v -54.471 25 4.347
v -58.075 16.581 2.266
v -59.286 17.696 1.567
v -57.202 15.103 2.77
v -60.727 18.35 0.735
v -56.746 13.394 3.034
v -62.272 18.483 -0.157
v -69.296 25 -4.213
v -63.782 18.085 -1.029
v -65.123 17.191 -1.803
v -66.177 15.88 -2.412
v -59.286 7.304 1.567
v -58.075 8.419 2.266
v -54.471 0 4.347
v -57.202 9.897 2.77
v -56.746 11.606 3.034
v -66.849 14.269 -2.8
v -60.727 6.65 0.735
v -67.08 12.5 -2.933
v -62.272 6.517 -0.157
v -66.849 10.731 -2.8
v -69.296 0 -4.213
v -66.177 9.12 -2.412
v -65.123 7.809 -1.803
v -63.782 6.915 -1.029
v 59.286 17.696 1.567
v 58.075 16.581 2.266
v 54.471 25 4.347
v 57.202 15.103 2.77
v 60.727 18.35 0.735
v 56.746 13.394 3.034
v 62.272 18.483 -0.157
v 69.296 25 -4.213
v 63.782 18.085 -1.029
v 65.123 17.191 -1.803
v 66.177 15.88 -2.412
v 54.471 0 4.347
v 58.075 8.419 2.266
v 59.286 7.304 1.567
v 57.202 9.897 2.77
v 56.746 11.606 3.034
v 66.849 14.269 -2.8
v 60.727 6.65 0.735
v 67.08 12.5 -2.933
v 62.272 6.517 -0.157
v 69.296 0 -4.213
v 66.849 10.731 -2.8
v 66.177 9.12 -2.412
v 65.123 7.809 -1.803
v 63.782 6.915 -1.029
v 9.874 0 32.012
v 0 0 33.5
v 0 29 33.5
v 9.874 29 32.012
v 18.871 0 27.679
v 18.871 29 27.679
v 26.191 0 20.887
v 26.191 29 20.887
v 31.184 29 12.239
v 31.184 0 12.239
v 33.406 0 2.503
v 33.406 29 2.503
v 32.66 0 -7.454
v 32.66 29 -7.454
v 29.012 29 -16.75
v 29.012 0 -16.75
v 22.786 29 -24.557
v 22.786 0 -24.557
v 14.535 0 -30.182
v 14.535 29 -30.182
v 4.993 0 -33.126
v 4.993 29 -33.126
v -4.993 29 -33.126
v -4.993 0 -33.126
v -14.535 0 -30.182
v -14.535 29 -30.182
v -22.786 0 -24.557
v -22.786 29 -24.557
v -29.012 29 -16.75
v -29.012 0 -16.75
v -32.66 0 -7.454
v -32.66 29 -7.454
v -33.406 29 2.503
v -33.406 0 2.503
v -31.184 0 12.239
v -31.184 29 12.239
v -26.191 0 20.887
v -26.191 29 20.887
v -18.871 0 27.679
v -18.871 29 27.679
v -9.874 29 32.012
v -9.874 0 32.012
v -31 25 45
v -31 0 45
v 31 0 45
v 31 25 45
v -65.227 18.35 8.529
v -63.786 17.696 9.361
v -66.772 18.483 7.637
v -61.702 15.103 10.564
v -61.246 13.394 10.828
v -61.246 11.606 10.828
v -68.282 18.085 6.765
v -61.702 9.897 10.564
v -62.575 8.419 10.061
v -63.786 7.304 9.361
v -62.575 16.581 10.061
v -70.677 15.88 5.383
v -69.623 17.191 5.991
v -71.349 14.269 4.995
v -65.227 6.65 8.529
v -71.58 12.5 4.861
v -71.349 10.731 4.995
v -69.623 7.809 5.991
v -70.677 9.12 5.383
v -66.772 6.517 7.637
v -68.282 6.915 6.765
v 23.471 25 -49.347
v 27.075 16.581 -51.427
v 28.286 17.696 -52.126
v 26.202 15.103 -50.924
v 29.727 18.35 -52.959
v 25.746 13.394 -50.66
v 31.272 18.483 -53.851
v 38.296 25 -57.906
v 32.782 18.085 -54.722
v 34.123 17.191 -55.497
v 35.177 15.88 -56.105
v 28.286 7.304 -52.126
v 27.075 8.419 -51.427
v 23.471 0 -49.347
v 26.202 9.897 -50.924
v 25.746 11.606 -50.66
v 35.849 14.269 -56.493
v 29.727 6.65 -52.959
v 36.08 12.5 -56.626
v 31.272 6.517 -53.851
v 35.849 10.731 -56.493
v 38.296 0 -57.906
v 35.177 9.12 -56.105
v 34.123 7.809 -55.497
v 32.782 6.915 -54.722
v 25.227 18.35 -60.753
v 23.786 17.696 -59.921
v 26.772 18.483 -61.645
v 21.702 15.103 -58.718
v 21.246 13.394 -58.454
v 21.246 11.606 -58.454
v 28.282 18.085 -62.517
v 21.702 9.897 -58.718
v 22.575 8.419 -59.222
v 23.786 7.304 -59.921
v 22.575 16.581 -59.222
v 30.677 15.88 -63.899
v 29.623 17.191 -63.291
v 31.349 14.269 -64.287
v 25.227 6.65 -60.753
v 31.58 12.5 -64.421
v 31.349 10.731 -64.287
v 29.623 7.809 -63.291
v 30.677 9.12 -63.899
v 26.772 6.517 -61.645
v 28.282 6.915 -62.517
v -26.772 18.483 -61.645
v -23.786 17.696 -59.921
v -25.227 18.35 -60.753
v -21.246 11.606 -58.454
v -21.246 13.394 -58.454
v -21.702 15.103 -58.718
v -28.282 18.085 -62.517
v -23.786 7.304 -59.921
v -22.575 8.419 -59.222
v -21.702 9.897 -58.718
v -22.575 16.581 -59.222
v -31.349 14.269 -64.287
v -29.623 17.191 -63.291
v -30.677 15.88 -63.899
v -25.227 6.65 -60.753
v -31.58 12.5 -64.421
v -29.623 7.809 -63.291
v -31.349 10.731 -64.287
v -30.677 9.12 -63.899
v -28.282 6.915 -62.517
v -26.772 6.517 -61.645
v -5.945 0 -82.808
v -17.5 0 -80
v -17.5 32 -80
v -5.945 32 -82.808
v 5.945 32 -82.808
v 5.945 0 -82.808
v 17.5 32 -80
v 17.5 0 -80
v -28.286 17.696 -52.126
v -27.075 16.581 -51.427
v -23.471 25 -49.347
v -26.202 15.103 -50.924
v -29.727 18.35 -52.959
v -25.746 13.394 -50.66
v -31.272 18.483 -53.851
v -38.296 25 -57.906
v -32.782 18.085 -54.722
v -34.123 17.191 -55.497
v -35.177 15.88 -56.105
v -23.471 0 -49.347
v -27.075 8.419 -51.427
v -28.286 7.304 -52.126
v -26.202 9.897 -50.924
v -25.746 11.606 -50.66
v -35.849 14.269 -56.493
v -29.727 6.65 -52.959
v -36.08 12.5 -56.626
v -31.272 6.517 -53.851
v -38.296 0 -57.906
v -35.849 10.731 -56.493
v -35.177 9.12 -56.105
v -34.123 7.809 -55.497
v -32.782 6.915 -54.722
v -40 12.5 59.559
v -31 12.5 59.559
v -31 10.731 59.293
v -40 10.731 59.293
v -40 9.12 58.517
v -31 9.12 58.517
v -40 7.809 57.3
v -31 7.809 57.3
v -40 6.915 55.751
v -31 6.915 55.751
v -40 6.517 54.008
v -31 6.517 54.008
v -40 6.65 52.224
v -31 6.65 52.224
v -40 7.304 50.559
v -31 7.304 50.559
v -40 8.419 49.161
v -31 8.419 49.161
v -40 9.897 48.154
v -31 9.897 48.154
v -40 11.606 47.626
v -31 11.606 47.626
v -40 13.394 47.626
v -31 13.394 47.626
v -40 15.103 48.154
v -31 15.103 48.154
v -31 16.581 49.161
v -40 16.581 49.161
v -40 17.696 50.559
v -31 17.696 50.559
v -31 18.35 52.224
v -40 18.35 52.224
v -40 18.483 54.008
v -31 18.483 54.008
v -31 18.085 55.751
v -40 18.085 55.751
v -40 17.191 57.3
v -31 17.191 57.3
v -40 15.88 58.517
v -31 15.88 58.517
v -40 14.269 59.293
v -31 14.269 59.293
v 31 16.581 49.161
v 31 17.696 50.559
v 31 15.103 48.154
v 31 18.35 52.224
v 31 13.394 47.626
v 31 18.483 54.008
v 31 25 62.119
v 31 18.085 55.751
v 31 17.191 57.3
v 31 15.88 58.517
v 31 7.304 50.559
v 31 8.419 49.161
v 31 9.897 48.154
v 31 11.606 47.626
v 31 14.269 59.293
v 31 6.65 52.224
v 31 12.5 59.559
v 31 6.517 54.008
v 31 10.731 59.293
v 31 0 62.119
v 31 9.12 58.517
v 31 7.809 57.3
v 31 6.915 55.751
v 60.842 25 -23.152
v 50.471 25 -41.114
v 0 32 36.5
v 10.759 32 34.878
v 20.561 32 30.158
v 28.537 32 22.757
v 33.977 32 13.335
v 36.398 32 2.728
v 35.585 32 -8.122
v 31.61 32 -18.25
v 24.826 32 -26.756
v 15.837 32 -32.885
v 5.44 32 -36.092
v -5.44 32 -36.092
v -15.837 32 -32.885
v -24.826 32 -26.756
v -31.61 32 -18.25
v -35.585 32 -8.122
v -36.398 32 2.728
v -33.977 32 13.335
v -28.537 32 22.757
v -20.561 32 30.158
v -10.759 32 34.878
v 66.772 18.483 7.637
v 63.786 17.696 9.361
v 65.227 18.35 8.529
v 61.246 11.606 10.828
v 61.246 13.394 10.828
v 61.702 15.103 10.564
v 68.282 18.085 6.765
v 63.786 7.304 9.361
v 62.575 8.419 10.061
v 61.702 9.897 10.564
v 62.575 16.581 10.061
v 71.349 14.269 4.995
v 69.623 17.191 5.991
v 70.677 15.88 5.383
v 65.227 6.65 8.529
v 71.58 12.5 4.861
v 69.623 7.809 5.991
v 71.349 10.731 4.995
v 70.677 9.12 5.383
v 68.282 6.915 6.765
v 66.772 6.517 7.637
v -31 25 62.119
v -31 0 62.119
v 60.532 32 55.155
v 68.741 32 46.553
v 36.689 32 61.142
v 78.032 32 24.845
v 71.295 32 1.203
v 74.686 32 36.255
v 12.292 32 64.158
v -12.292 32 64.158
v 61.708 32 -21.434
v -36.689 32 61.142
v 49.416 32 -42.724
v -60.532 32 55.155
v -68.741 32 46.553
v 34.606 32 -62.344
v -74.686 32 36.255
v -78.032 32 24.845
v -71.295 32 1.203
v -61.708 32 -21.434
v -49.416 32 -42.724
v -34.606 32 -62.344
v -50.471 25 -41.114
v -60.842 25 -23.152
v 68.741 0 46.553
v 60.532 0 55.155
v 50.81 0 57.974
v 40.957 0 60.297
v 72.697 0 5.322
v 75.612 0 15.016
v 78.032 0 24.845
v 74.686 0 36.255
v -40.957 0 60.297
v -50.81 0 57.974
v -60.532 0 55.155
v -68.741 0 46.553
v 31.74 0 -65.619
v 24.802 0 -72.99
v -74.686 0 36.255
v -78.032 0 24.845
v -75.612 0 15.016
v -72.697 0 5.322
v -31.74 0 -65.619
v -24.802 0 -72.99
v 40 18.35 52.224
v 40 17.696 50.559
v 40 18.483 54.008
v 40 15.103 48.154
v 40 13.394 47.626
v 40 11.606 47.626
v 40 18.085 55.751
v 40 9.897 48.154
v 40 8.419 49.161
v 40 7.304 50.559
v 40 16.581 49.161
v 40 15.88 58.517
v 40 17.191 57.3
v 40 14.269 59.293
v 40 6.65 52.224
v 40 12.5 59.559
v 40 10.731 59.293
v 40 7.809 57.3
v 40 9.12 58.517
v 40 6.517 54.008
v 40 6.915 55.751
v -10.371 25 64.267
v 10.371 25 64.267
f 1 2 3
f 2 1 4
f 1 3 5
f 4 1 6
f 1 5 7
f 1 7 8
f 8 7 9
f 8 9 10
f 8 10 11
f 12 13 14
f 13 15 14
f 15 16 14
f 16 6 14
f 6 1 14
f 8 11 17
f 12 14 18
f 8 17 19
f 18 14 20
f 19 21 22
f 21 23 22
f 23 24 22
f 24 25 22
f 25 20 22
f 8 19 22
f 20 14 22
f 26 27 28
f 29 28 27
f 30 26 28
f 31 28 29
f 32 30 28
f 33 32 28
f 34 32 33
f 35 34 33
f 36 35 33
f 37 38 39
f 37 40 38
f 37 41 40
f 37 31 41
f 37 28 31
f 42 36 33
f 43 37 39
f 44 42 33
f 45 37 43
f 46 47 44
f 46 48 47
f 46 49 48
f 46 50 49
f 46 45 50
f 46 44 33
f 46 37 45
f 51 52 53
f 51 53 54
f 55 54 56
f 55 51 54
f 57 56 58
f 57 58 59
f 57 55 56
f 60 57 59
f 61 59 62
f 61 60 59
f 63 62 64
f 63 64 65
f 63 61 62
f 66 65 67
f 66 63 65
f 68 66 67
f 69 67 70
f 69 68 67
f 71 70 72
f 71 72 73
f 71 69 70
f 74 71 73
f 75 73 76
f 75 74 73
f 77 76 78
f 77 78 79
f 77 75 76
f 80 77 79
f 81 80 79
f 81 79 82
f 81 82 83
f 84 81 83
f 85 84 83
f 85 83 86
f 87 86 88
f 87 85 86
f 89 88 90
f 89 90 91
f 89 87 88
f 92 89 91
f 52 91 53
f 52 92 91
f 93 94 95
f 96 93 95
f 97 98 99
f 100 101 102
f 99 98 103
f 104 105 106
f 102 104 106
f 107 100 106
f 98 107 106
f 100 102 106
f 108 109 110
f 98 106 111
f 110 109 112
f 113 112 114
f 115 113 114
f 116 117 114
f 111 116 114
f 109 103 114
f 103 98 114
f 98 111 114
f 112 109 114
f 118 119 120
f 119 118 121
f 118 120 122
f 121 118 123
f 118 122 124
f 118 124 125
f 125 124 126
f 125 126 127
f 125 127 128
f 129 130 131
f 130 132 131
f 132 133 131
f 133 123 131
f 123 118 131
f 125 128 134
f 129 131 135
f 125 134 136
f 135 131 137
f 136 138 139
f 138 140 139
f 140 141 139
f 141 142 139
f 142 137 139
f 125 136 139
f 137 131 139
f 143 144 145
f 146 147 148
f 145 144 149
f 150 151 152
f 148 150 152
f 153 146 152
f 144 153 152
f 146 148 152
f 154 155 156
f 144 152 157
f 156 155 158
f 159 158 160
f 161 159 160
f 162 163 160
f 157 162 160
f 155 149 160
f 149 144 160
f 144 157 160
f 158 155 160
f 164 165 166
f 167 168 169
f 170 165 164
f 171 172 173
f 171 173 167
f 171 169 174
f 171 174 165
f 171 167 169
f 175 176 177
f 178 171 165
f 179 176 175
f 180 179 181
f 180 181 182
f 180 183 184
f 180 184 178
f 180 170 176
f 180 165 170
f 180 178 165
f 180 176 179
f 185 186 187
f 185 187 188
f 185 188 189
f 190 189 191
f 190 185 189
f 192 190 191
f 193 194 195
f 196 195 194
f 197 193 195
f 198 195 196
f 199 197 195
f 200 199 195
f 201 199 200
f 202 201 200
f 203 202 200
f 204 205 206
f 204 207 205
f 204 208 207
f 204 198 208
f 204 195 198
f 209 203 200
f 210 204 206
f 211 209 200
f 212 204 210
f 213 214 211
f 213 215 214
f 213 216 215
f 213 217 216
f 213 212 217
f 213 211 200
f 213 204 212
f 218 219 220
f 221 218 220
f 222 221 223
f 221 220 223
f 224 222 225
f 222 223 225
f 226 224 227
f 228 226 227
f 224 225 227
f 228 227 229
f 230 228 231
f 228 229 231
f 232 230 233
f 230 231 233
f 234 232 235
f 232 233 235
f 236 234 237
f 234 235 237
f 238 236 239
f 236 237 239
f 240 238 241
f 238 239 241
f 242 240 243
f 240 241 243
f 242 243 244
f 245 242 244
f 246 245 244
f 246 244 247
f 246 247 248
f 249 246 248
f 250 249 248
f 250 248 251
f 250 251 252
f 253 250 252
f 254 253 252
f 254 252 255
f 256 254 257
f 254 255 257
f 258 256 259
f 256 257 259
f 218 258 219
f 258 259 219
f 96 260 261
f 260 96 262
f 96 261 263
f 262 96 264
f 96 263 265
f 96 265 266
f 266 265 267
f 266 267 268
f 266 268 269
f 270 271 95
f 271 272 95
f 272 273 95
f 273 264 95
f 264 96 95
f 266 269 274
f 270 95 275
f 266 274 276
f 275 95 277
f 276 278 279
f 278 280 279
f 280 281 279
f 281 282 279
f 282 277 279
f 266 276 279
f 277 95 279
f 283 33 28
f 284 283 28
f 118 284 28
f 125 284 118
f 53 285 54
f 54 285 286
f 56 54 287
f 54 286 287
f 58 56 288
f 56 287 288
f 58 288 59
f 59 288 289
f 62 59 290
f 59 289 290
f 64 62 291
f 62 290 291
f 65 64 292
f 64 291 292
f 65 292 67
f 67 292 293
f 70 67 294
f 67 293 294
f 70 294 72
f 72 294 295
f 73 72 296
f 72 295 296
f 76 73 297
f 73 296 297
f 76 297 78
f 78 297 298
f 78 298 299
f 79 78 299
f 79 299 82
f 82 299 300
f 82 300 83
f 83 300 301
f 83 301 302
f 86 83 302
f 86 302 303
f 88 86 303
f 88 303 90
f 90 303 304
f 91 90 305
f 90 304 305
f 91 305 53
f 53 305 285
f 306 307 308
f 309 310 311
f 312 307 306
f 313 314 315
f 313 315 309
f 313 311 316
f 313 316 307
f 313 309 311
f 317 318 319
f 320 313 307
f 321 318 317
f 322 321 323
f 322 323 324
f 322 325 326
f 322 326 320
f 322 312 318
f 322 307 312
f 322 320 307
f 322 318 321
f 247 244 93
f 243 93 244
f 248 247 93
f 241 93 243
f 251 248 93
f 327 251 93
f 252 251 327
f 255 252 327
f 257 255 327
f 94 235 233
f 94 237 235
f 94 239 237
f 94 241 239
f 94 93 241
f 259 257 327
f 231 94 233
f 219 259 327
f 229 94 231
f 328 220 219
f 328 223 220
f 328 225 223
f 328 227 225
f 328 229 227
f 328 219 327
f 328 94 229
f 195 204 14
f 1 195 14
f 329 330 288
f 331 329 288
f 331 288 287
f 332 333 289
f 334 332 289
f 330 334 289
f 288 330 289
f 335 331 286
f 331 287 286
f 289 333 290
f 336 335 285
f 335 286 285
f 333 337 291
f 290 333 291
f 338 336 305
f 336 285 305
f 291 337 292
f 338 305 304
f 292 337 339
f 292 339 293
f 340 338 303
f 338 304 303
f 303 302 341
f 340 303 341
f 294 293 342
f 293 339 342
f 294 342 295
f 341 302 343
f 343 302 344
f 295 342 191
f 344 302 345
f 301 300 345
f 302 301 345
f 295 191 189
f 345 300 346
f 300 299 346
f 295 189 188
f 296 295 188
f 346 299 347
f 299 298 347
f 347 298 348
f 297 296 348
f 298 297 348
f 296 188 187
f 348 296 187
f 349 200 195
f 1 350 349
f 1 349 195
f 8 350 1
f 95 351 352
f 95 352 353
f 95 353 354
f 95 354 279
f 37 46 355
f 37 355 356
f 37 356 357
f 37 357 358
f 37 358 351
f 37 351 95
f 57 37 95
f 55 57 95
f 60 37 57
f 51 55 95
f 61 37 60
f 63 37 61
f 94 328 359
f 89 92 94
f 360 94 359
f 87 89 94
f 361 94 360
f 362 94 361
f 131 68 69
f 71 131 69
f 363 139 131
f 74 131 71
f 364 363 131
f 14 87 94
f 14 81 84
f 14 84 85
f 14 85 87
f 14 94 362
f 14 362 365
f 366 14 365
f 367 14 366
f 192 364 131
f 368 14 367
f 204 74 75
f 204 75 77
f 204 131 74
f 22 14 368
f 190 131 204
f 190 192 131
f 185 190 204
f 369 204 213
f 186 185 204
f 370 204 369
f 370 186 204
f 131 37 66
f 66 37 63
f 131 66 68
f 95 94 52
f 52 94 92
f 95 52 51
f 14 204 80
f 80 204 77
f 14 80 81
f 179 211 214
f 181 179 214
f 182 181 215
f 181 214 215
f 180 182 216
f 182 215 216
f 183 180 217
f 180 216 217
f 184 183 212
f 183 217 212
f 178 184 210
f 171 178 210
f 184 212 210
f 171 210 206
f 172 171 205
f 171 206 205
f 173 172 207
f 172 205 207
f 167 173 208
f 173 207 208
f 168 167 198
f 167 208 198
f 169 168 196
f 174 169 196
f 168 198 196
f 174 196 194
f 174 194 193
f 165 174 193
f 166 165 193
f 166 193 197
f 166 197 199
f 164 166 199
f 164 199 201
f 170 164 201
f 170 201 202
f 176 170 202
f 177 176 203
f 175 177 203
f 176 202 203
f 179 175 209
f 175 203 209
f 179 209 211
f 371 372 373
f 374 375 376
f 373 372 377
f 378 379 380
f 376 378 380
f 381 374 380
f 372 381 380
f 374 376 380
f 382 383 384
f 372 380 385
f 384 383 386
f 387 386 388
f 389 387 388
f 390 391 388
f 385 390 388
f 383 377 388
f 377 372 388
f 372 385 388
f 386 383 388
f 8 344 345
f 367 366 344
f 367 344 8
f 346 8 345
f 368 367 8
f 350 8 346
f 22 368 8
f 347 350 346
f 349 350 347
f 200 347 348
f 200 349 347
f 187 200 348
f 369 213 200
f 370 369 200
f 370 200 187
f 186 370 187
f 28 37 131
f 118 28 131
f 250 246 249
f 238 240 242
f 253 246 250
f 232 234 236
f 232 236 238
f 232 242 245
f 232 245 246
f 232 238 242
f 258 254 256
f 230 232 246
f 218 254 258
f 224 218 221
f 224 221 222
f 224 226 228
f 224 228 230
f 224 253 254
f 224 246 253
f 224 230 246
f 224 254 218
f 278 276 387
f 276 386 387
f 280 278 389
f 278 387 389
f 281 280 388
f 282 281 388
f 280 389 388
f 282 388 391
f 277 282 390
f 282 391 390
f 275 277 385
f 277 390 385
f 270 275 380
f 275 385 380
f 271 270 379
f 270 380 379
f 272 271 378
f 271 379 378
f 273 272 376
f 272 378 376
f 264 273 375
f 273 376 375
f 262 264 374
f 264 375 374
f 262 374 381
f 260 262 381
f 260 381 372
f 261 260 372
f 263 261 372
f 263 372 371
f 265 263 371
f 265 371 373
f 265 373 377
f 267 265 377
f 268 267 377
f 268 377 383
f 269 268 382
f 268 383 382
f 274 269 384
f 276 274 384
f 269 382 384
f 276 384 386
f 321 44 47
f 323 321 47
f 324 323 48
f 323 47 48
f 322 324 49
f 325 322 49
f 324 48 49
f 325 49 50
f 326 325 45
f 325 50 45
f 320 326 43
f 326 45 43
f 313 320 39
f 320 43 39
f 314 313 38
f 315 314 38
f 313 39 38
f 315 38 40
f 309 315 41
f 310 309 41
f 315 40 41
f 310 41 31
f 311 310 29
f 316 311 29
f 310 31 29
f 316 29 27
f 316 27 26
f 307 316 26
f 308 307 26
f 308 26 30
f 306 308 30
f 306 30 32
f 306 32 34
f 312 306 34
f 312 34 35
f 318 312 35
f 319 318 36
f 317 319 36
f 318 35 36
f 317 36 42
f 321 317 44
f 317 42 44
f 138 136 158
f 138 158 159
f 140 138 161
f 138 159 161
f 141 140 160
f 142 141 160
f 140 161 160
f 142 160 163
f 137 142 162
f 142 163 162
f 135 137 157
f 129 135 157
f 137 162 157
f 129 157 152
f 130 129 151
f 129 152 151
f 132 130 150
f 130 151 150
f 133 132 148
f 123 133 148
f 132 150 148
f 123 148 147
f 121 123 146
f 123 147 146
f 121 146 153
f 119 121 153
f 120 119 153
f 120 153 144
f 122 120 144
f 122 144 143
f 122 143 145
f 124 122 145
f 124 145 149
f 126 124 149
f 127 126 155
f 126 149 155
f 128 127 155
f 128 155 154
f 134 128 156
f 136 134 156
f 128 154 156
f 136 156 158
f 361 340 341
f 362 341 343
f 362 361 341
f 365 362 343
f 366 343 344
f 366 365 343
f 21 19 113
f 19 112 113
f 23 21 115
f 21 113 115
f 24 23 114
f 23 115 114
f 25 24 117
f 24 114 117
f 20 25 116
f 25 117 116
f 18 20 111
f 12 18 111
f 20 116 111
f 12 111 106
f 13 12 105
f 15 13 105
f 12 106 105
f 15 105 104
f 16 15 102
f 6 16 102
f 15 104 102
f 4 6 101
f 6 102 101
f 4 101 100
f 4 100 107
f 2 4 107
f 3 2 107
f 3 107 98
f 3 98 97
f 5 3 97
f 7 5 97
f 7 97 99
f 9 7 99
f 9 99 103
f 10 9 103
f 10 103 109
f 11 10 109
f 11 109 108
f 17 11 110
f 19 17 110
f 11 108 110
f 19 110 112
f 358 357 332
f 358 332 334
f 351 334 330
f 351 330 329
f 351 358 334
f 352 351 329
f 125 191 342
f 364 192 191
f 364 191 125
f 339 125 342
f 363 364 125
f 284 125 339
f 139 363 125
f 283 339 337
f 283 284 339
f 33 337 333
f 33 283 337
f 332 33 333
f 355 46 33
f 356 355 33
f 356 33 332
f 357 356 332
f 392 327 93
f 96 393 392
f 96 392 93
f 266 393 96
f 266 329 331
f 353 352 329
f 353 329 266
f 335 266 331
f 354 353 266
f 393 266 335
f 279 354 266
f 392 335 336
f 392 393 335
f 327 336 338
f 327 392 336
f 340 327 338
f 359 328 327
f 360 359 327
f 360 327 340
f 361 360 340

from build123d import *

# Parameters (mm, degrees)
SKETCH1_R           = 33.5
BOSS_EXTRUDE1_DEPTH = 32
CHAMFER1_SIZE       = 3
SKETCH2_W           = 62
SKETCH2_H           = 20
CUT_EXTRUDE1_DEPTH  = 25
SKETCH3_R           = 6
CUT_EXTRUDE2_DEPTH  = 40
CIRPATTERN1_COUNT   = 3


with BuildPart() as part:
    # Sketch1 → Boss-Extrude1 (new body)
    with BuildSketch(Plane(origin=(0, 0, 0), x_dir=(1, 0, 0), z_dir=(0, 1, 0))):
        with BuildLine():
            ThreePointArc((17.5, 80), (55.889587347, 32.2678683), (78.032032303, -24.844555434))
            ThreePointArc((78.032032303, -24.844555434), (72.020850643, -41.581257506), (60.532032303, -55.155444566))
            ThreePointArc((60.532032303, -55.155444566), (0, -64.5357366), (-60.532032303, -55.155444566))
            ThreePointArc((-60.532032303, -55.155444566), (-72.020850643, -41.581257506), (-78.032032303, -24.844555434))
            ThreePointArc((-78.032032303, -24.844555434), (-55.889587347, 32.2678683), (-17.5, 80))
            ThreePointArc((-17.5, 80), (0, 83.162515012), (17.5, 80))
        make_face()
        with Locations(Location((0, 0, 0), (0, 0, 270))):
            Circle(SKETCH1_R, mode=Mode.SUBTRACT)
    extrude(amount=BOSS_EXTRUDE1_DEPTH)

    # Chamfer1
    chamfer1_edges = [part.edges().sort_by_distance(p)[0] for p in [
        (0, 32, -33.5),
    ]]
    chamfer(chamfer1_edges, length=CHAMFER1_SIZE)

    # Sketch2 → Cut-Extrude1 (cut)
    with BuildSketch(Plane.XZ):
        with Locations((0, 55)):
            Rectangle(SKETCH2_W, SKETCH2_H)
    cut_extrude1 = extrude(amount=-CUT_EXTRUDE1_DEPTH, mode=Mode.SUBTRACT)

    # Sketch3 → Cut-Extrude2 (cut, symmetric)
    with BuildSketch(Plane(origin=(0, 0, 0), x_dir=(0, 0, -1), z_dir=(1, 0, 0))):
        with Locations(Location((-53.559315298, 12.5, 0), (0, 0, 180))):
            Circle(SKETCH3_R)
    cut_extrude2 = extrude(amount=CUT_EXTRUDE2_DEPTH, both=True, mode=Mode.SUBTRACT)

    # CirPattern1: Cut-Extrude1, Cut-Extrude2 ×3 about axis
    cirpattern1_axis = Axis((0, 0, 0), (0, 1, 0))
    add([cut_extrude1.rotate(cirpattern1_axis, i * 360 / CIRPATTERN1_COUNT) for i in range(1, CIRPATTERN1_COUNT)], mode=Mode.SUBTRACT)
    add([cut_extrude2.rotate(cirpattern1_axis, i * 360 / CIRPATTERN1_COUNT) for i in range(1, CIRPATTERN1_COUNT)], mode=Mode.SUBTRACT)


solid = part.part
